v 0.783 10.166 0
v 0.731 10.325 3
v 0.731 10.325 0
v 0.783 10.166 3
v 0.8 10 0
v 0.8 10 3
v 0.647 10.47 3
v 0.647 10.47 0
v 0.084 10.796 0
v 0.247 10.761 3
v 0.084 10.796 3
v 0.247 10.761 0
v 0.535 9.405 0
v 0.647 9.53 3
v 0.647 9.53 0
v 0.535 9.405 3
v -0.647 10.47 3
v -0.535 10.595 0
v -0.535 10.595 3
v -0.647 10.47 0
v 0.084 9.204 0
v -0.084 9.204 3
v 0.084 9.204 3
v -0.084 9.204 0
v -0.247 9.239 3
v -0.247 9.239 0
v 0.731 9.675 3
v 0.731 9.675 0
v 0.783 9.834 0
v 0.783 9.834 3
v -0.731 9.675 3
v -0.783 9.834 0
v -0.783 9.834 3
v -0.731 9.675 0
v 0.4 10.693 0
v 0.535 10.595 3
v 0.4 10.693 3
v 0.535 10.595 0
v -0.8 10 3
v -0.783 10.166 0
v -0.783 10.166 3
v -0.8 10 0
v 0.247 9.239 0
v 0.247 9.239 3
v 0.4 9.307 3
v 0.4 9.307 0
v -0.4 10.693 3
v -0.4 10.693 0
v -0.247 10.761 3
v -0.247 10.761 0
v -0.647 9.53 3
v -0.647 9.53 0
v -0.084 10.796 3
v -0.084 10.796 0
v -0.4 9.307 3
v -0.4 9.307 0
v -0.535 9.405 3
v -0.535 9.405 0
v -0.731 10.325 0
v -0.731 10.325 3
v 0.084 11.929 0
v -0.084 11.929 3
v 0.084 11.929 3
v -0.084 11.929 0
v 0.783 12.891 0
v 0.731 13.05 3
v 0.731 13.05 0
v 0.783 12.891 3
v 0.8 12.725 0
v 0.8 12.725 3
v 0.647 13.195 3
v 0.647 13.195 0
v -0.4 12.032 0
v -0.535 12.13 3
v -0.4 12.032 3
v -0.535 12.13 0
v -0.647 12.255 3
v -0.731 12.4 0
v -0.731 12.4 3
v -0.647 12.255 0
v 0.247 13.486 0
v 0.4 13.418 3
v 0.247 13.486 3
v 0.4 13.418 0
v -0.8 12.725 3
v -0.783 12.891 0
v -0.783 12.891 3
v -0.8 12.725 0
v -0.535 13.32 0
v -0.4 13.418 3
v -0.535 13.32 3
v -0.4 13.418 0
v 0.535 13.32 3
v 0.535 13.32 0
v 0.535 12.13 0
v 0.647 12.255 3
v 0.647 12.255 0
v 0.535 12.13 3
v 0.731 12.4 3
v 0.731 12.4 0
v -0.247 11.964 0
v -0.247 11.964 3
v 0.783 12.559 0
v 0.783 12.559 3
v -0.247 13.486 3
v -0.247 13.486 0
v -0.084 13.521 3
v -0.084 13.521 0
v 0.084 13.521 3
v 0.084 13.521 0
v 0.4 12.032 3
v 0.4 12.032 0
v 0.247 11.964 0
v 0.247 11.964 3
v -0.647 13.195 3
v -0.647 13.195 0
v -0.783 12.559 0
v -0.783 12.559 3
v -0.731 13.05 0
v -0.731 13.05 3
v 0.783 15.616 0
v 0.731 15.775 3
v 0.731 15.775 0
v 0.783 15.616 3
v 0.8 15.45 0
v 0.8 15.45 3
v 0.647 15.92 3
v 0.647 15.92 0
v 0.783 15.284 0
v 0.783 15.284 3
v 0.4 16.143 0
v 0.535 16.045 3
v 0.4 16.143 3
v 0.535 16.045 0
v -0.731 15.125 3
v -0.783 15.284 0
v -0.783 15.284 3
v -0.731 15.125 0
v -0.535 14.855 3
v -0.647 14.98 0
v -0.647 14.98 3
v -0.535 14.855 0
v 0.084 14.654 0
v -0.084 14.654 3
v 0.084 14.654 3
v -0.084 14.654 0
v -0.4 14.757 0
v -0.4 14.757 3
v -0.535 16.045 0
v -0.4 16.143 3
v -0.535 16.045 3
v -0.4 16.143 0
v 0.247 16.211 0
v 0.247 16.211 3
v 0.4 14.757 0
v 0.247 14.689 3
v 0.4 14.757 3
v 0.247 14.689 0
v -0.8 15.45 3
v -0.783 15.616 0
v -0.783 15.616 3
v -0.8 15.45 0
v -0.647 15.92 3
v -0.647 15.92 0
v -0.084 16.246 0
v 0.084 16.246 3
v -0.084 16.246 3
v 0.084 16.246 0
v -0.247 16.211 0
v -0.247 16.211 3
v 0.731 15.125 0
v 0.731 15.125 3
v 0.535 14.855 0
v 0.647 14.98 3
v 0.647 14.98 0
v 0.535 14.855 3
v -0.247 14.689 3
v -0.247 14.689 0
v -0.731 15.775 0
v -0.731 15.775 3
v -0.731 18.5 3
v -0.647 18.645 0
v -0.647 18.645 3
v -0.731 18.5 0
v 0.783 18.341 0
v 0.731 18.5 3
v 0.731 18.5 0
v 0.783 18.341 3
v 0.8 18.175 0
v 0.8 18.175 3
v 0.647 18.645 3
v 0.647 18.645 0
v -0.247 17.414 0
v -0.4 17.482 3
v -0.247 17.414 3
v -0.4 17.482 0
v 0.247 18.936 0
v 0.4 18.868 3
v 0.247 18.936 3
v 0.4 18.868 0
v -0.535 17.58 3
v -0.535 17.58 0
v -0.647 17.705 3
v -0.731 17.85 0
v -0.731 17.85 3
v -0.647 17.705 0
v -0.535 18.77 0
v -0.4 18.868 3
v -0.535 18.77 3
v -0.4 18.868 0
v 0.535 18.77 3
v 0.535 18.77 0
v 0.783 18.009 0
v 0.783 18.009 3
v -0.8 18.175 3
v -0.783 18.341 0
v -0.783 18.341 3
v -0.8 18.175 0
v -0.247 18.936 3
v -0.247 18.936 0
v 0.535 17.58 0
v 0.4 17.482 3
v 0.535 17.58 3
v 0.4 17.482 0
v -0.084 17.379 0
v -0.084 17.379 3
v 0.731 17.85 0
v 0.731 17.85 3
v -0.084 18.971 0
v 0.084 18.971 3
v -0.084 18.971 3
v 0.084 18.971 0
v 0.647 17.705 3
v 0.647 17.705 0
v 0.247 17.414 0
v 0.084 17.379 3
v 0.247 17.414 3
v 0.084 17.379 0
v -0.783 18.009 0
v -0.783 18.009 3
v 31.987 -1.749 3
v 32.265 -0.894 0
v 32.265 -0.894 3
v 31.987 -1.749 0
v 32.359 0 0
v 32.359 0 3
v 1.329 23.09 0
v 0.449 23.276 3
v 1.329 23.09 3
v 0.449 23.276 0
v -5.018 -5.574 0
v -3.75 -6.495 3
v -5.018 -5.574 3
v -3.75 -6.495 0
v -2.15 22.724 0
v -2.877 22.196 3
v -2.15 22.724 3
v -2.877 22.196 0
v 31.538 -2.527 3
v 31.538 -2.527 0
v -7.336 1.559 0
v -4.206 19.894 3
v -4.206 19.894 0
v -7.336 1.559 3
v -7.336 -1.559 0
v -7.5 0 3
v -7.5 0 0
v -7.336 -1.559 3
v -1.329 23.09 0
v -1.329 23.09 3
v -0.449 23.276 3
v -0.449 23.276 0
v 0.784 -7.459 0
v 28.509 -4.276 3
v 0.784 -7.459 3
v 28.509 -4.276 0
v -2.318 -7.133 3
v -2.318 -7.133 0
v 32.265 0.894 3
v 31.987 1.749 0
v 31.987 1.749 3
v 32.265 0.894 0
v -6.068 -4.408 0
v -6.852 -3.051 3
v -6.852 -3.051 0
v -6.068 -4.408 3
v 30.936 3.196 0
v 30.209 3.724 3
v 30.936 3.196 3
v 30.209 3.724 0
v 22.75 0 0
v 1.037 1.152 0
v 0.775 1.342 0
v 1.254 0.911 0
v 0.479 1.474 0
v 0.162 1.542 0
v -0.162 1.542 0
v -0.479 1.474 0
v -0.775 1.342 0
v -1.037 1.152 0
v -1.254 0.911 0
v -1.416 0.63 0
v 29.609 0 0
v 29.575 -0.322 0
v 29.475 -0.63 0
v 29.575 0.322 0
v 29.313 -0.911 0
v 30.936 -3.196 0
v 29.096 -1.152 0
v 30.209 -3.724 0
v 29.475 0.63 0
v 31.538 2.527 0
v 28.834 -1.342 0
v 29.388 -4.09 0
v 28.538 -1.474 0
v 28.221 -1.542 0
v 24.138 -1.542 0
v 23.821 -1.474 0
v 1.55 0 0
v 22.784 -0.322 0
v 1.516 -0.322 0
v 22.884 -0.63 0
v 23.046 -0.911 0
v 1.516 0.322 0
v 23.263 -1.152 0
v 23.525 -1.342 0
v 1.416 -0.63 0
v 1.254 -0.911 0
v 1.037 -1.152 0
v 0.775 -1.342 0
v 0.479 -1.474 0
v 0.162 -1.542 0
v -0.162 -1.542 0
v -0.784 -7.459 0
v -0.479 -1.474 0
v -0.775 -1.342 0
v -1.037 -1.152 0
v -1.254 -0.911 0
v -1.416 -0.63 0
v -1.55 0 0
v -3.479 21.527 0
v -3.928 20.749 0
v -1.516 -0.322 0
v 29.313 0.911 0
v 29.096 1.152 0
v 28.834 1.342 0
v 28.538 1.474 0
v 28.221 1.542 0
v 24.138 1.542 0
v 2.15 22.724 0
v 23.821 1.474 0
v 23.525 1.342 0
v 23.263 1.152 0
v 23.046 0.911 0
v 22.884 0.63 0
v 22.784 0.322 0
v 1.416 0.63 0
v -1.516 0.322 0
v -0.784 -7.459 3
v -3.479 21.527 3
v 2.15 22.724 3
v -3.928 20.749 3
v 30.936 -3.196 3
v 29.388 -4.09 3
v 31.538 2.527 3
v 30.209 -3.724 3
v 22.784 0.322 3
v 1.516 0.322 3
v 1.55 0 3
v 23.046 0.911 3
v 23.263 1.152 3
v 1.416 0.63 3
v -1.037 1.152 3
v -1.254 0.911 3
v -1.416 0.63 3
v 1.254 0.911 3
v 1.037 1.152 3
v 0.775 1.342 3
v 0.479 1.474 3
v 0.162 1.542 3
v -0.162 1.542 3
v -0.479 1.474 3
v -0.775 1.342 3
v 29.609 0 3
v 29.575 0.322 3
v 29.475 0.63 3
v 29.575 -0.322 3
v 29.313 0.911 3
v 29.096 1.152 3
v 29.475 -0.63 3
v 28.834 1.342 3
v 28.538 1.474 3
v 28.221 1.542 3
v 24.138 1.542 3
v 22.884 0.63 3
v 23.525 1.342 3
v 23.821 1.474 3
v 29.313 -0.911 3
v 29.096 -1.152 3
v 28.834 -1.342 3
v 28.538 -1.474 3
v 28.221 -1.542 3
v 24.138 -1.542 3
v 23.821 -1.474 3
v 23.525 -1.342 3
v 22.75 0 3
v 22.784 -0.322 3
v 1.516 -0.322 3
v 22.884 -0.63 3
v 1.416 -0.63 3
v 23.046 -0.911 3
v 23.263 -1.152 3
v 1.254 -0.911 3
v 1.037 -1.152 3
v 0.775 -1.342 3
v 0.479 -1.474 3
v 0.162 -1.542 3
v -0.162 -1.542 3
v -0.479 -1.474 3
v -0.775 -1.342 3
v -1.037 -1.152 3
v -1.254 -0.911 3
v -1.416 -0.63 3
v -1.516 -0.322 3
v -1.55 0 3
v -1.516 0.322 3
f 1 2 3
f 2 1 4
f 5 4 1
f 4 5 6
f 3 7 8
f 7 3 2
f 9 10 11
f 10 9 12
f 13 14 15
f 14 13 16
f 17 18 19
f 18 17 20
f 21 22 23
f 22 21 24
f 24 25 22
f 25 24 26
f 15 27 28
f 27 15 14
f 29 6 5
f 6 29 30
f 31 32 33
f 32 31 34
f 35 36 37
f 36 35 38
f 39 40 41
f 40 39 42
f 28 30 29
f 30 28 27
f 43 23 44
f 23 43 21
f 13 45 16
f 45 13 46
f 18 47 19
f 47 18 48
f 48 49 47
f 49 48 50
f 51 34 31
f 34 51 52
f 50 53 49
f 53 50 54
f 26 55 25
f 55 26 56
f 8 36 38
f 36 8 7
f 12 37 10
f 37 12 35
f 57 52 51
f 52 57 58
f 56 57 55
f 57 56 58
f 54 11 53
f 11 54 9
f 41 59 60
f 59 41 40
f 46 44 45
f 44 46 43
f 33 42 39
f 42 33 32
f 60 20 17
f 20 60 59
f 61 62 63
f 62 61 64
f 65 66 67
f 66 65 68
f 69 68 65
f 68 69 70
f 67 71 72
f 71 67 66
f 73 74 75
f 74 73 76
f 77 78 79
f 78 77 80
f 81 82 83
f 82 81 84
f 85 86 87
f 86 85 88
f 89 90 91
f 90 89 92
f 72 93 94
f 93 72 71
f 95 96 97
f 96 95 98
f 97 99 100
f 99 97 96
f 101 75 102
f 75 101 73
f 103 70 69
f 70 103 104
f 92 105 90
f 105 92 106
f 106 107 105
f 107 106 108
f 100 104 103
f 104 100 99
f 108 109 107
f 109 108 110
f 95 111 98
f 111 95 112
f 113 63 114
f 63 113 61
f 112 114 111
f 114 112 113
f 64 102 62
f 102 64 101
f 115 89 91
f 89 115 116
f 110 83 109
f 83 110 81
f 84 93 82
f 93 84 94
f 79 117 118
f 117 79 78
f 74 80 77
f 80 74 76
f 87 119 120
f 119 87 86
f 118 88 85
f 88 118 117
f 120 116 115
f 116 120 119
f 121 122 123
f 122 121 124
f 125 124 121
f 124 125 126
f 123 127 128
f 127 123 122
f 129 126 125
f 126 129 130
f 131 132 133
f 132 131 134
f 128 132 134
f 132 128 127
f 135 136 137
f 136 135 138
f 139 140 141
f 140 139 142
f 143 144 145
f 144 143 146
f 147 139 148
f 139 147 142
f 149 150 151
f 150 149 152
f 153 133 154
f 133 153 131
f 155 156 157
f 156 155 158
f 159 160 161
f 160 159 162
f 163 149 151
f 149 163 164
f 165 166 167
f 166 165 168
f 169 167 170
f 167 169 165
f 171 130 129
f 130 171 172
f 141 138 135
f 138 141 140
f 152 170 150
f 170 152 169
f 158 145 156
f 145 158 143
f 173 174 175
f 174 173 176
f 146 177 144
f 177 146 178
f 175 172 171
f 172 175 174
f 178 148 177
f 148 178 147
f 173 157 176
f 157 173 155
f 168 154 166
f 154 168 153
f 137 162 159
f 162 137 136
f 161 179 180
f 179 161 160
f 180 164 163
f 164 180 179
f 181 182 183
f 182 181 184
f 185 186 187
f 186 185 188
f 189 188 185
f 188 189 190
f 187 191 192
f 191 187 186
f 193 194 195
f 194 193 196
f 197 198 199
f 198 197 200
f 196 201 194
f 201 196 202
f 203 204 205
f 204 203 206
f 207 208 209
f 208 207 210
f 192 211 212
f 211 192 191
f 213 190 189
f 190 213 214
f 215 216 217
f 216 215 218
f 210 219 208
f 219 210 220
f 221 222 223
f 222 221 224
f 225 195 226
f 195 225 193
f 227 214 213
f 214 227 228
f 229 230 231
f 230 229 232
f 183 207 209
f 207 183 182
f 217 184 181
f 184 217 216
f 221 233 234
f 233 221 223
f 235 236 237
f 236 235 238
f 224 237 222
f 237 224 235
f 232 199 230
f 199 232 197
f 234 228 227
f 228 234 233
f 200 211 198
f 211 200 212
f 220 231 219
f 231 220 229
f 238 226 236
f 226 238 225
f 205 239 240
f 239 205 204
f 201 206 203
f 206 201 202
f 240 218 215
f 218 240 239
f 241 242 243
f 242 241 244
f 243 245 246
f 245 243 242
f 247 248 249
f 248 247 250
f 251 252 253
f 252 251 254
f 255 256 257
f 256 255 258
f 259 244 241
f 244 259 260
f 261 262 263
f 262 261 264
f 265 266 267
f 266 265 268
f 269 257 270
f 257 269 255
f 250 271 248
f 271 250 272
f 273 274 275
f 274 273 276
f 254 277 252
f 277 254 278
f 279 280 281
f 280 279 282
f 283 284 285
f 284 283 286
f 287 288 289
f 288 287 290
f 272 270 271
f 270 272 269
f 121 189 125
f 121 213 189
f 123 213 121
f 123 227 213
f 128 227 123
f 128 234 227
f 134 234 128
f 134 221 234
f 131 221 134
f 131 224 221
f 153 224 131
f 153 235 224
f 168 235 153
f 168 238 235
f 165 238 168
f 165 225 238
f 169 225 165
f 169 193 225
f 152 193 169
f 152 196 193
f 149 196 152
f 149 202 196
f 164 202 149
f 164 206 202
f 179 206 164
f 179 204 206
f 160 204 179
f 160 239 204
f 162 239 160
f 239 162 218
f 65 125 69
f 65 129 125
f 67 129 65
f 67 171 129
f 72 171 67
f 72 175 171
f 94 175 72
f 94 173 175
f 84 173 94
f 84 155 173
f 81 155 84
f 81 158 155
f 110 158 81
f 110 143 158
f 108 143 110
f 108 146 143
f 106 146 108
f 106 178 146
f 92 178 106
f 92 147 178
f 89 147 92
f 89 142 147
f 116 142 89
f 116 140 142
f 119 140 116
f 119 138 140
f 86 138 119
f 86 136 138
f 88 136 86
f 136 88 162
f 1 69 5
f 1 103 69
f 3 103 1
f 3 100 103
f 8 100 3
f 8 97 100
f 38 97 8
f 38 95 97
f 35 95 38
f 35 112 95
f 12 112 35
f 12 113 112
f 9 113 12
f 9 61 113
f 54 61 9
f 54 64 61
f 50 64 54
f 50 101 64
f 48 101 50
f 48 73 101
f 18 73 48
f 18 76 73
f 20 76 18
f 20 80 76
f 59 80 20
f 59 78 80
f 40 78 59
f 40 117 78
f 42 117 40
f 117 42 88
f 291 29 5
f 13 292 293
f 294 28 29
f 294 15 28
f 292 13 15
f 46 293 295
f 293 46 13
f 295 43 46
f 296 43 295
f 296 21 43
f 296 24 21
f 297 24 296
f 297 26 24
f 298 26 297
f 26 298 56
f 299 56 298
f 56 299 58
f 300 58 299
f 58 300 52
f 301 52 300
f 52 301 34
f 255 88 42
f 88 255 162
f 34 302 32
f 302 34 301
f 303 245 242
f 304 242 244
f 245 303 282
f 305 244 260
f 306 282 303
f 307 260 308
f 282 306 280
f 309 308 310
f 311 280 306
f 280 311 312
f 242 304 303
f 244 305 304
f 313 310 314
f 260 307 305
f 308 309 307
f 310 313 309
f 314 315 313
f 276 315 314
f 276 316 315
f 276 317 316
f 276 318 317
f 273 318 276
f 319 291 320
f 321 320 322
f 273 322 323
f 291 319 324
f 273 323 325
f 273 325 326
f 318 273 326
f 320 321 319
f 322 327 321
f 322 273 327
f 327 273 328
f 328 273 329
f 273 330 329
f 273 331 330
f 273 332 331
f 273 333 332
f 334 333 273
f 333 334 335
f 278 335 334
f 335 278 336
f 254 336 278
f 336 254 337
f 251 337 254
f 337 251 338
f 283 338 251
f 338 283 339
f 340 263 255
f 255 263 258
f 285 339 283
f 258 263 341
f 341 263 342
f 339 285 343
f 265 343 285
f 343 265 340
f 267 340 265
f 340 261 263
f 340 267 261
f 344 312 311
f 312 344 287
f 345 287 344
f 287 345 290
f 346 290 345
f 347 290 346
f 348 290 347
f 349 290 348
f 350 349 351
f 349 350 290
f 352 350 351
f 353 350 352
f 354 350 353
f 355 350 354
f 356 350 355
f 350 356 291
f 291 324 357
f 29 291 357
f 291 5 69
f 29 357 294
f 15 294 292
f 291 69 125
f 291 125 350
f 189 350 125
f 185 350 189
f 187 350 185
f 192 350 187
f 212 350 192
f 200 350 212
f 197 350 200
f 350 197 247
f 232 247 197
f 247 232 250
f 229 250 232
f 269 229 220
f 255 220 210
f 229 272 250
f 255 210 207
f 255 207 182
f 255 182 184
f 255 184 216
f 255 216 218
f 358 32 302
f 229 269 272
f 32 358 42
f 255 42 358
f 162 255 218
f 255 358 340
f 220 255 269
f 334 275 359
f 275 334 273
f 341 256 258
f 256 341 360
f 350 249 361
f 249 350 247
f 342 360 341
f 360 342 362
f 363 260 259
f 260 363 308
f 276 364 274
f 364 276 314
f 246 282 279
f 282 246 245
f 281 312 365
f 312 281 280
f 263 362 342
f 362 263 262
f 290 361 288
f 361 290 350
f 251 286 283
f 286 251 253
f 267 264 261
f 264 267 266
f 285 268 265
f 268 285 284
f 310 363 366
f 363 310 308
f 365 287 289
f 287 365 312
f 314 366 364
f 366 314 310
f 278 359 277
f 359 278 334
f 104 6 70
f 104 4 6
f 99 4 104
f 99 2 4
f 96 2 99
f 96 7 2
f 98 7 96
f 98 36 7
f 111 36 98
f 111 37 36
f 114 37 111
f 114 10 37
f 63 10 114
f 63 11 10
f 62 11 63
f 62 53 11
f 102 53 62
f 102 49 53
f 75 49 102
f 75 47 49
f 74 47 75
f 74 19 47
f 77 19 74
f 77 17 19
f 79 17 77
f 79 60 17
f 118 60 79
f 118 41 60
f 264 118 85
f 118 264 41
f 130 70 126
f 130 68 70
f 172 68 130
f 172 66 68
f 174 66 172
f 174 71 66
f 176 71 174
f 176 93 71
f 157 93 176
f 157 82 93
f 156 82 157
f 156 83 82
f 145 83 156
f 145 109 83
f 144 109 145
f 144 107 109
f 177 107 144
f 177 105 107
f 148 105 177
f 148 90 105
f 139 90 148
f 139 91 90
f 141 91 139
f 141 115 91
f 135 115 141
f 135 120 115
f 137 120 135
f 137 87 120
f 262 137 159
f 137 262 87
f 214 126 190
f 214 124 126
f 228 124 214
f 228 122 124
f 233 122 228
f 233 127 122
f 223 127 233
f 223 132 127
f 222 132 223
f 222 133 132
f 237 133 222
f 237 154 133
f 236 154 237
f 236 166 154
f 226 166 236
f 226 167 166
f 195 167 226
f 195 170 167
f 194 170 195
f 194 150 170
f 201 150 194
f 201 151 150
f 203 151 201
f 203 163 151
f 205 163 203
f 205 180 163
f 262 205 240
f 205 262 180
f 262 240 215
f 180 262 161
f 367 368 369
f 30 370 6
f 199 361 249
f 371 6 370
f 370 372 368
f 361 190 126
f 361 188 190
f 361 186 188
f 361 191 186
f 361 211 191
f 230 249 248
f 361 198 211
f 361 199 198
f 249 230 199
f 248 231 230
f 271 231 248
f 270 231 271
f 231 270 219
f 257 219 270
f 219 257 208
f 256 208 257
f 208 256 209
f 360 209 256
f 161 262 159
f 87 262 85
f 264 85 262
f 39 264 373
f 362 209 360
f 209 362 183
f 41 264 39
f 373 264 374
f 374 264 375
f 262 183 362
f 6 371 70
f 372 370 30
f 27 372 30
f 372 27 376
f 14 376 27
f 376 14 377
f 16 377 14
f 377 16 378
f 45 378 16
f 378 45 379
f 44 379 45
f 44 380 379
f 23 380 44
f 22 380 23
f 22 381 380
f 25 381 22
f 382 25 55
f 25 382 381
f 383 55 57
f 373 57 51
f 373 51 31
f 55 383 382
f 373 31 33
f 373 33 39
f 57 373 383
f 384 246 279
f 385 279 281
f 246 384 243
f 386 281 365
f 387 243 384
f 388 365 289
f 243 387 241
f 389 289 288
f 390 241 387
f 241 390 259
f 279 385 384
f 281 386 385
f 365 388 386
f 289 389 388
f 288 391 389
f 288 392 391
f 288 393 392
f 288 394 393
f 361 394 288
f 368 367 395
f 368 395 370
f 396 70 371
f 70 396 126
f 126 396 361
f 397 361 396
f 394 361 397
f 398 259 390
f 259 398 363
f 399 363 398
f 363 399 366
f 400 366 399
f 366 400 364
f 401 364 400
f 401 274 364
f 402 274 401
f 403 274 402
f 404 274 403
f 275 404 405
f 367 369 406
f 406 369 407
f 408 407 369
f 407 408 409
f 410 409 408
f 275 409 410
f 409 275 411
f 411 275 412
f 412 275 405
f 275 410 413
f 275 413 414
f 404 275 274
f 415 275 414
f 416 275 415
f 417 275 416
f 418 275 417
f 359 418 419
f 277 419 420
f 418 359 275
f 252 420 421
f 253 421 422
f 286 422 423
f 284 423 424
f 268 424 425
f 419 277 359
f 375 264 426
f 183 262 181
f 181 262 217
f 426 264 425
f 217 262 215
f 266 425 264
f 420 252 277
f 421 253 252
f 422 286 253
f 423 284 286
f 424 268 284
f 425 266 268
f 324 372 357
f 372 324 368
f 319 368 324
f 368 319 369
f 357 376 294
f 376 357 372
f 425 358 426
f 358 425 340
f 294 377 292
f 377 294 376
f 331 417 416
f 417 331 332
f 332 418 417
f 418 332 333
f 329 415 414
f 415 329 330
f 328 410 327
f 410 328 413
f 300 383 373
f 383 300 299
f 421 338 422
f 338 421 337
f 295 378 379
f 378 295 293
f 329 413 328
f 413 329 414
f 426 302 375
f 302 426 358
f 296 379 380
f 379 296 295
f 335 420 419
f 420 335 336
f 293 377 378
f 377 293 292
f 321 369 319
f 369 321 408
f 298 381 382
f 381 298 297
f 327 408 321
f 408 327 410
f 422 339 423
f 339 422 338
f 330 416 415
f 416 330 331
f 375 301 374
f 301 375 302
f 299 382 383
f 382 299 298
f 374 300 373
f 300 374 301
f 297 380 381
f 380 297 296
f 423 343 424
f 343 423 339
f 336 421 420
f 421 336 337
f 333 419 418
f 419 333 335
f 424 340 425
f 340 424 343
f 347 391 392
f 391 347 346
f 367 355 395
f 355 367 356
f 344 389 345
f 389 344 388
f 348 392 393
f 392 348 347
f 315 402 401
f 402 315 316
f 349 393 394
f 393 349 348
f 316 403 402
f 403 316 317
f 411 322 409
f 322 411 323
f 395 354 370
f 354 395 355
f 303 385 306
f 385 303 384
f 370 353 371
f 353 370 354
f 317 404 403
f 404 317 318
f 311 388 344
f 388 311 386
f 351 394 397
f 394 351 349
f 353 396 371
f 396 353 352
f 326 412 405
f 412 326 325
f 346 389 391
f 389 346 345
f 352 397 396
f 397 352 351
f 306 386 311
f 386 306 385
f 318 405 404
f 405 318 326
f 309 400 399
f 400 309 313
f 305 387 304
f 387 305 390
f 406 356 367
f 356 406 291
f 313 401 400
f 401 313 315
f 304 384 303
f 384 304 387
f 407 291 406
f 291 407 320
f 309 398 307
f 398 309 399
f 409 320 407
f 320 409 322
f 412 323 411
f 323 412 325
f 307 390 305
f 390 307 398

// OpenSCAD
// file: lib/servos.scad
include <../../parameters.scad>

module D485HW_servo(screw_holes=false) {
	difference() {
		union() {
			cube([39.8, 19.8, 38], center=true);

			translate([0, 0, 28-38/2+1.25/2])
			cube([53.5, 19.8, 1.25], center=true);

			translate([53.5/2-16.8, 0, 38/2-1])
			cylinder(d=M5_screw_diameter, h=7.6, $fn=30);
		}

		if(screw_holes==false) {
			translate([-48.5/2, 5, 0])
			cylinder(d=M3_screw_diameter, h=30, $fn=30);

			translate([-48.5/2, -5, 0])
			cylinder(d=M3_screw_diameter, h=30, $fn=30);

			translate([48.5/2, 5, 0])
			cylinder(d=M3_screw_diameter, h=30, $fn=30);

			translate([48.5/2, -5, 0])
			cylinder(d=M3_screw_diameter, h=30, $fn=30);
		}
	}

	if(screw_holes==true) {
		translate([-48.5/2, 5, 0])
		cylinder(d=M3_screw_diameter, h=30, $fn=30);

		translate([-48.5/2, -5, 0])
		cylinder(d=M3_screw_diameter, h=30, $fn=30);

		translate([48.5/2, 5, 0])
		cylinder(d=M3_screw_diameter, h=30, $fn=30);

		translate([48.5/2, -5, 0])
		cylinder(d=M3_screw_diameter, h=30, $fn=30);
	}
}

module D5313_servo(screw_holes=false) {
	difference() {
		union() {
			cube([23.1, 12.1, 26.7], center=true);

			translate([0, 0, 26.7/2-7])
			cube([32, 12.1, 1.25], center=true);

			translate([23.1/2-5.5, 0, 26.7/2-1])
			cylinder(d=M5_screw_diameter, h=4.6, $fn=30);
		}

		if(screw_holes==false) {
			translate([-28/2, 6.5/2, 0])
			cylinder(d=M2_5_screw_diameter, h=30, $fn=30);

			translate([-28/2, -6.5/2, 0])
			cylinder(d=M2_5_screw_diameter, h=30, $fn=30);

			translate([28/2, 6.5/2, 0])
			cylinder(d=M2_5_screw_diameter, h=30, $fn=30);

			translate([28/2, -6.5/2, 0])
			cylinder(d=M2_5_screw_diameter, h=30, $fn=30);
		}
	}

	if(screw_holes==true) {
		translate([-28/2, 6.5/2, 0])
		cylinder(d=M2_5_screw_diameter, h=30, $fn=30);

		translate([-28/2, -6.5/2, 0])
		cylinder(d=M2_5_screw_diameter, h=30, $fn=30);

		translate([28/2, 6.5/2, 0])
		cylinder(d=M2_5_screw_diameter, h=30, $fn=30);

		translate([28/2, -6.5/2, 0])
		cylinder(d=M2_5_screw_diameter, h=30, $fn=30);
	}
}

D5313_servo();
// file: lib/ALU_profile_holder_top.scad
include <../../parameters.scad>



module ALU_profile_holder_top(deep=35) {
    wall_thickness = ALU_profile_holder_wall_thickness;
    
    module screw_holes() {
        translate([wall_thickness/2, 8, ALU_profile_width/2]) {
            rotate([0, 90, 0]) 
                cylinder(d=M6_screw_diameter, h=wall_thickness*2, center=true, $fn=20);
        }
        translate([wall_thickness/2, deep-10, ALU_profile_width/2]) {
                rotate([0, 90, 0])
                cylinder(d=M6_screw_diameter, h=wall_thickness*2, center=true, $fn=20);
            
        }
    }
    
    difference() {
        cube([ALU_profile_width+wall_thickness*2, deep+wall_thickness*2, ALU_profile_width]);
        translate([wall_thickness, -0.1, -0.1])
            cube([ALU_profile_width, deep+0.1, ALU_profile_width+0.2]);
        
        screw_holes();
        translate([ALU_profile_width+wall_thickness, 0, 0])
            screw_holes();
    }
}

ALU_profile_holder_top(35);
// file: 888_1008.scad
include <../parameters.scad>
use <./lib/ALU_profile_holder_top.scad>

use <./lib/servos.scad>

module 888_1008() {
	difference() {
		union() {
			translate([0, -35.01, 0])
			ALU_profile_holder_top();

			difference() {
				hull() {
					cube([ALU_profile_width+ALU_profile_holder_wall_thickness*2, 6, ALU_profile_width]);

					translate([ALU_profile_width/2+ALU_profile_holder_wall_thickness, lock_axle_diameter/2+10, 0])
					cylinder(d=lock_axle_diameter+5, h=ALU_profile_width+12, $fn=30);
				}

				translate([0, 0, 5])
				cube([ALU_profile_width*2, ALU_profile_width*2, lock_depth+1]);
			}

			translate([ALU_profile_width+ALU_profile_holder_wall_thickness, -35.01-12-40-5, 0])
			cube([ALU_profile_holder_wall_thickness, 12+40+1+5, ALU_profile_width]);

			// servo holders
			translate([ALU_profile_width+ALU_profile_holder_wall_thickness*2-1, -(lock_arms_joint_offset+servo_joint_offset+servo_joint_offset_by_angle)+23.1, 0])
			cube([10+1+2, 6, 2]);

			translate([ALU_profile_width+ALU_profile_holder_wall_thickness*2-1, -(lock_arms_joint_offset+servo_joint_offset+servo_joint_offset_by_angle)-6, 0])
			cube([10+1+2, 6, 2]);

			translate([ALU_profile_width/2+ALU_profile_holder_wall_thickness, lock_axle_diameter/2+10, lock_depth/2+5])
			difference() {
				cube([10, 10, lock_depth+1], center=true);

				translate([0, 0, -1])
				cube([10-1, 10-1, lock_depth+3], center=true);
			}
		}

		translate([ALU_profile_width/2+ALU_profile_holder_wall_thickness, lock_axle_diameter/2+10, -1])
		union() {
			cylinder(d=8.1, h=31, $fn=30);

			translate([0, 0, 30])
			cylinder(d=M6_screw_diameter, h=ALU_profile_width*2, $fn=30);

			translate([0, 0, 36])
			cylinder(d=M6_nut_diameter, h=ALU_profile_width*2, $fn=6);
		}


		translate([ALU_profile_width+ALU_profile_holder_wall_thickness*2+12.1/2+.1, -(lock_arms_joint_offset+servo_joint_offset+servo_joint_offset_by_angle-0.5)+23.1/2, 26.7/2])
		rotate([180, 0, 90])
		D5313_servo(true);

		translate([0, -80, ALU_profile_width/2])
		rotate([0, 90, 0])
		cylinder(d=M6_screw_diameter, h=60, $fn=30);
	}
}

888_1008();

/*
translate([ALU_profile_width+ALU_profile_holder_wall_thickness*2+12.1/2+.1, -23.1/2-35.1, 26.7/2])
rotate([0, 180, -90])
#D5313_servo();
*/
// file: ../parameters.scad
maximum_printable_size = 150;

layer_thickness = 0.3;
global_clearance = 0.5;


//Screw diameter and nut for M10 [mm]
M10_screw_diameter = 10.4;
M10_head_height = 10;
M10_head_diameter = 16+0.5;
M10_nut_height = 10.5;
M10_nut_diameter = 25.5;
M10_nut_pocket = 22.3;

//Screw diameter for M8 [mm]
M8_screw_diameter = 8.6;
M8_head_height = 8;
M8_head_diameter = 13.5;
M8_nut_height = 7.5;
M8_square_nut_thin_height = 4.5;
M8_nut_diameter = 14.4 + 0.5;
M8_nut_pocket = 13 + 0.5;
M8_washer_diameter = 16;
M8_washer_thickness = 1.5;


//Screw diameter and nut for M6 [mm]
M6_screw_diameter=6.5;
M6_head_diameter = 10+0.5;
M6_head_height = 6;
M6_nut_height = 4.9;
M6_nut_diameter = 11.8;
M6_nut_pocket = 10.4;
M6_square_nut_height = 3;
M6_square_nut_diameter = 10;
M6_washer_thickness = 1.6;

//Screw diameter and nut for M5 [mm]
M5_screw_diameter=5.5;
M5_head_height = 5;
M5_head_diameter = 13+0.5;
M5_nut_height = 4.5;
M5_nut_diameter = 9.4;
M5_nut_pocket = 8.4;

//Screw diameter and nut for M4 [mm]
M4_screw_diameter=4.5;
M4_screw_head_height = 4;
M4_nut_height = 3.2;
M4_nut_diameter = 8.4;
M4_nut_pocket = 7.5;

//Screw diameter and nut for M3 [mm]
M3_screw_diameter = 3.2;
M3_nut_height = 2.7;
M3_nut_diameter = 6.6;
M3_nut_pocket = 5.6;
M3_screw_head_height = 3;

//Screw diameter and nut for M2,5 [mm]
M2_5_screw_diameter = 2.7;
M2_5_nut_height = 2.3;
M2_5_nut_diameter = 6;
M2_5_nut_pocket = 5.5;

// kulove lozisko

bearing_efsm_08_h = 33+1;
bearing_efsm_08_m = 22;
bearing_efsm_08_db = 18;
bearing_efsm_08_ag = 10.5;
bearing_efsm_08_n = M4_screw_diameter;
bearing_efsm_08_a1 = 5.5;
bearing_efsm_08_d = 8.25;
bearing_efsm_08_B = 8; // ball height

bearing_efsm_10_h = 38+1;
bearing_efsm_10_m = 26;
bearing_efsm_10_db = 21.9;
bearing_efsm_10_ag = 12+0.2;
bearing_efsm_10_n = M5_screw_diameter;
bearing_efsm_10_a1 = 6.5;
bearing_efsm_10_d = 10.25;


bearing_efsm_12_width = 40+1;
bearing_efsm_12_h = bearing_efsm_12_width;
bearing_efsm_12_boltd = 28/2; // polovina vzdalenosti mezi srouby
bearing_efsm_12_m = bearing_efsm_12_boltd*2;
bearing_efsm_12_db = 25;
bearing_efsm_12_ag = 13;
bearing_efsm_12_a1 = 7;
bearing_efsm_12_n = M5_screw_diameter;
bearing_efsm_12_d = 12.15;
bearing_efsm_12_B = 10; // ball height
bearing_efsm_space = 1;

bearing_efsm_17_width = 54+1;
bearing_efsm_17_h = bearing_efsm_17_width;
bearing_efsm_17_boltd = 38/2; // polovina vzdalenosti mezi srouby
bearing_efsm_17_m = bearing_efsm_17_boltd*2;
bearing_efsm_17_db = 35;
bearing_efsm_17_ag = 18;
bearing_efsm_17_n = M6_screw_diameter;
bearing_efsm_17_a1 = 10;
bearing_efsm_17_B = 17; // ball height

//limcove lozisko
bearing_EFOM_10_L=26; //celkova sirka zakladny
bearing_EFOM_10_d1=10.3;//diametr otvoru real=10 mm
bearing_EFOM_10_dB=22;//diametr vystupku pro ulozeni lozika
bearing_EFOM_10_H=52;//celková delka zakladny
bearing_EFOM_10_J=36;// hole pitch
bearing_EFOM_10_A1=6.5;//vyska pouzdra
bearing_EFOM_10_Ag=12;//celkova vyska
bearing_EFOM_10_N1=5;//sirka otvoru pro sroub
bearing_EFOM_10_N2=8;//delka otvoru pro sroub
bearing_EFOM_10_m=36;//roztec der pro sroub
bearing_EFOM_10_h=9;//vyska lozika


608_bearing_outer_diameter = 22.3;
608_bearing_inner_diameter = 16;
608_bearing_thickness = 7.1;


// 20 KG servo parameters

servo_20kg_axis_offset = 9.375; // jak je osa mimo stredu
servo_20kg_body_x = 42;
servo_20kg_body_y = 21;
servo_20kg_body_z = 40;
servo_20kg_thread_x = 49/2;
servo_20kg_thread_y = 10/2;
servo_20kg_body_below = 10; // jak hluboko je tělo serva pod drzaky na srouby
servo_20kg_below = 25.8; // jak hluboko je páka serva pod drzaky na srouby

servo_20kg_bolt_d = 2.5+0.3;
servo_20kg_nut_d = 5+0.3;


//strain gauge
strain_gauge_width = 12.7;
strain_gauge_length = 75.1;
strain_gauge_screw_distance = 10;

//ALU profile
ALU_profile_width = 30.5;
ALU_profile_holder_wall_thickness = 3;
ALU_profile_groove_width = 8;

//pillow block bearing
//https://www.igus.eu/product/372
//Part no. KSTM-08
KSTM08_screws_distance = 33;         //m
KSTM08_screws_holes_diameter = 4.5;  //d2
KSTM08_flange_thickness = 6;         //h3
KSTM08_case_width = 9;               //C1
KSTM08_case_length = 47;             //a
KSTM08_ball_width = 12;              //B
KSTM08_ball_hole_diameter = 7.85;    //d1


//ložiska pro malý rotor
bearing_outer_diameter = 10.2;    // Rozměr B1 v nákresu s přídavkem na toleranci otvoru
bearing_thickness = 4;        // Rozměr B2 v nákresu
//bearing_shaft_length = 19.5;    // Rozměr B3 v nákresu, Originalni hodnota 19.5
bearing_shaft_length = 20;    // Rozměr B3 v nákresu


//simple platform parameters ////////////////////////////////////////////
front_holder_width = 160;
front_holder_angle = 25;
front_holder_height = 60;
front_holder_offset = 15;

// lock moving servo parameters
// static par.
servo_length = 23.1;
servo_width = 12.1;
servo_height = 26.7;
servo_axle_offset = 2.5;
servo_axle_height = 5;
servo_movement_angle = 40;
servo_movement_angle_offset = -10; // angle offset up
servo_force = 0.5; // [N/m] torque of servo

// dynamic par.
servo_arm_length = servo_width/2+ALU_profile_width/2+ALU_profile_holder_wall_thickness;
servo_travel_y = cos(servo_movement_angle)*servo_arm_length;
servo_arm_hole_length = (servo_arm_length/cos(servo_movement_angle+servo_movement_angle_offset))-servo_arm_length;
servo_joint_offset = sin(servo_movement_angle+servo_movement_angle_offset)*(servo_arm_length+servo_arm_hole_length+5);
servo_joint_offset_by_angle = -tan(servo_movement_angle_offset)*servo_arm_length;
servo_max_linear_force = servo_force/(servo_arm_length/1000); // max servo linear force [N]
servo_min_linear_force = cos(servo_movement_angle+abs(servo_movement_angle_offset))*servo_max_linear_force; // min servo linear force [N] in the most extreme position
servo_holding_linear_force = cos(servo_movement_angle+servo_movement_angle_offset)*servo_max_linear_force; // min servo linear force [N] in holding position

// lock static parameters
lock_screws_dia = 3.1;
lock_depth = 20;
lock_axle_diameter = 15;
lock_grab_axle_dia = 13;
lock_arms_joint_offset = 30;
lock_arms_joint_angle = 55;

// lock dynamic parameters
lock_push_force = (servo_holding_linear_force/cos(lock_arms_joint_angle))/cos(lock_arms_joint_angle); // lock arm pushing force on linear servo joint
lock_push_arm_length = tan(lock_arms_joint_angle)*lock_arms_joint_offset;
lock_arm_force_ratio = 1; // lock arm change holding force ratio (0.5 = arm will have half holding force)
lock_hold_arm_length = lock_push_arm_length/lock_arm_force_ratio;
lock_holding_force = lock_push_force*lock_arm_force_ratio;
lock_joint_arm_length = sqrt(pow(lock_push_arm_length, 2)+pow(lock_arms_joint_offset, 2));
// main file
include <../parameters.scad>

use <./888_1008.scad>

module 888_1009() {
	difference() {
		union() {
			hull() {
				cylinder(d=15, h=3, $fn=30);

				translate([servo_arm_length+servo_arm_hole_length, 0, 0])
				cylinder(d=M3_nut_diameter+2, h=3, $fn=30);

				translate([0, 19, 0])
				cylinder(d=M3_nut_diameter+2, h=3, $fn=30);
			}
		}

		translate([0, 0, -1])
		cylinder(d=lock_screws_dia, h=17, $fn=30);

		for(i=[10:2.725:19]) {
			translate([0, i, -1])
			cylinder(d=1.6, h=5, $fn=30);
		}

		translate([servo_arm_length, 0, -1])
		hull() {
			cylinder(d=lock_screws_dia, h=17, $fn=30);

			translate([servo_arm_hole_length, 0, 0])
			cylinder(d=lock_screws_dia, h=17, $fn=30);
		}
	}
}

888_1009();
